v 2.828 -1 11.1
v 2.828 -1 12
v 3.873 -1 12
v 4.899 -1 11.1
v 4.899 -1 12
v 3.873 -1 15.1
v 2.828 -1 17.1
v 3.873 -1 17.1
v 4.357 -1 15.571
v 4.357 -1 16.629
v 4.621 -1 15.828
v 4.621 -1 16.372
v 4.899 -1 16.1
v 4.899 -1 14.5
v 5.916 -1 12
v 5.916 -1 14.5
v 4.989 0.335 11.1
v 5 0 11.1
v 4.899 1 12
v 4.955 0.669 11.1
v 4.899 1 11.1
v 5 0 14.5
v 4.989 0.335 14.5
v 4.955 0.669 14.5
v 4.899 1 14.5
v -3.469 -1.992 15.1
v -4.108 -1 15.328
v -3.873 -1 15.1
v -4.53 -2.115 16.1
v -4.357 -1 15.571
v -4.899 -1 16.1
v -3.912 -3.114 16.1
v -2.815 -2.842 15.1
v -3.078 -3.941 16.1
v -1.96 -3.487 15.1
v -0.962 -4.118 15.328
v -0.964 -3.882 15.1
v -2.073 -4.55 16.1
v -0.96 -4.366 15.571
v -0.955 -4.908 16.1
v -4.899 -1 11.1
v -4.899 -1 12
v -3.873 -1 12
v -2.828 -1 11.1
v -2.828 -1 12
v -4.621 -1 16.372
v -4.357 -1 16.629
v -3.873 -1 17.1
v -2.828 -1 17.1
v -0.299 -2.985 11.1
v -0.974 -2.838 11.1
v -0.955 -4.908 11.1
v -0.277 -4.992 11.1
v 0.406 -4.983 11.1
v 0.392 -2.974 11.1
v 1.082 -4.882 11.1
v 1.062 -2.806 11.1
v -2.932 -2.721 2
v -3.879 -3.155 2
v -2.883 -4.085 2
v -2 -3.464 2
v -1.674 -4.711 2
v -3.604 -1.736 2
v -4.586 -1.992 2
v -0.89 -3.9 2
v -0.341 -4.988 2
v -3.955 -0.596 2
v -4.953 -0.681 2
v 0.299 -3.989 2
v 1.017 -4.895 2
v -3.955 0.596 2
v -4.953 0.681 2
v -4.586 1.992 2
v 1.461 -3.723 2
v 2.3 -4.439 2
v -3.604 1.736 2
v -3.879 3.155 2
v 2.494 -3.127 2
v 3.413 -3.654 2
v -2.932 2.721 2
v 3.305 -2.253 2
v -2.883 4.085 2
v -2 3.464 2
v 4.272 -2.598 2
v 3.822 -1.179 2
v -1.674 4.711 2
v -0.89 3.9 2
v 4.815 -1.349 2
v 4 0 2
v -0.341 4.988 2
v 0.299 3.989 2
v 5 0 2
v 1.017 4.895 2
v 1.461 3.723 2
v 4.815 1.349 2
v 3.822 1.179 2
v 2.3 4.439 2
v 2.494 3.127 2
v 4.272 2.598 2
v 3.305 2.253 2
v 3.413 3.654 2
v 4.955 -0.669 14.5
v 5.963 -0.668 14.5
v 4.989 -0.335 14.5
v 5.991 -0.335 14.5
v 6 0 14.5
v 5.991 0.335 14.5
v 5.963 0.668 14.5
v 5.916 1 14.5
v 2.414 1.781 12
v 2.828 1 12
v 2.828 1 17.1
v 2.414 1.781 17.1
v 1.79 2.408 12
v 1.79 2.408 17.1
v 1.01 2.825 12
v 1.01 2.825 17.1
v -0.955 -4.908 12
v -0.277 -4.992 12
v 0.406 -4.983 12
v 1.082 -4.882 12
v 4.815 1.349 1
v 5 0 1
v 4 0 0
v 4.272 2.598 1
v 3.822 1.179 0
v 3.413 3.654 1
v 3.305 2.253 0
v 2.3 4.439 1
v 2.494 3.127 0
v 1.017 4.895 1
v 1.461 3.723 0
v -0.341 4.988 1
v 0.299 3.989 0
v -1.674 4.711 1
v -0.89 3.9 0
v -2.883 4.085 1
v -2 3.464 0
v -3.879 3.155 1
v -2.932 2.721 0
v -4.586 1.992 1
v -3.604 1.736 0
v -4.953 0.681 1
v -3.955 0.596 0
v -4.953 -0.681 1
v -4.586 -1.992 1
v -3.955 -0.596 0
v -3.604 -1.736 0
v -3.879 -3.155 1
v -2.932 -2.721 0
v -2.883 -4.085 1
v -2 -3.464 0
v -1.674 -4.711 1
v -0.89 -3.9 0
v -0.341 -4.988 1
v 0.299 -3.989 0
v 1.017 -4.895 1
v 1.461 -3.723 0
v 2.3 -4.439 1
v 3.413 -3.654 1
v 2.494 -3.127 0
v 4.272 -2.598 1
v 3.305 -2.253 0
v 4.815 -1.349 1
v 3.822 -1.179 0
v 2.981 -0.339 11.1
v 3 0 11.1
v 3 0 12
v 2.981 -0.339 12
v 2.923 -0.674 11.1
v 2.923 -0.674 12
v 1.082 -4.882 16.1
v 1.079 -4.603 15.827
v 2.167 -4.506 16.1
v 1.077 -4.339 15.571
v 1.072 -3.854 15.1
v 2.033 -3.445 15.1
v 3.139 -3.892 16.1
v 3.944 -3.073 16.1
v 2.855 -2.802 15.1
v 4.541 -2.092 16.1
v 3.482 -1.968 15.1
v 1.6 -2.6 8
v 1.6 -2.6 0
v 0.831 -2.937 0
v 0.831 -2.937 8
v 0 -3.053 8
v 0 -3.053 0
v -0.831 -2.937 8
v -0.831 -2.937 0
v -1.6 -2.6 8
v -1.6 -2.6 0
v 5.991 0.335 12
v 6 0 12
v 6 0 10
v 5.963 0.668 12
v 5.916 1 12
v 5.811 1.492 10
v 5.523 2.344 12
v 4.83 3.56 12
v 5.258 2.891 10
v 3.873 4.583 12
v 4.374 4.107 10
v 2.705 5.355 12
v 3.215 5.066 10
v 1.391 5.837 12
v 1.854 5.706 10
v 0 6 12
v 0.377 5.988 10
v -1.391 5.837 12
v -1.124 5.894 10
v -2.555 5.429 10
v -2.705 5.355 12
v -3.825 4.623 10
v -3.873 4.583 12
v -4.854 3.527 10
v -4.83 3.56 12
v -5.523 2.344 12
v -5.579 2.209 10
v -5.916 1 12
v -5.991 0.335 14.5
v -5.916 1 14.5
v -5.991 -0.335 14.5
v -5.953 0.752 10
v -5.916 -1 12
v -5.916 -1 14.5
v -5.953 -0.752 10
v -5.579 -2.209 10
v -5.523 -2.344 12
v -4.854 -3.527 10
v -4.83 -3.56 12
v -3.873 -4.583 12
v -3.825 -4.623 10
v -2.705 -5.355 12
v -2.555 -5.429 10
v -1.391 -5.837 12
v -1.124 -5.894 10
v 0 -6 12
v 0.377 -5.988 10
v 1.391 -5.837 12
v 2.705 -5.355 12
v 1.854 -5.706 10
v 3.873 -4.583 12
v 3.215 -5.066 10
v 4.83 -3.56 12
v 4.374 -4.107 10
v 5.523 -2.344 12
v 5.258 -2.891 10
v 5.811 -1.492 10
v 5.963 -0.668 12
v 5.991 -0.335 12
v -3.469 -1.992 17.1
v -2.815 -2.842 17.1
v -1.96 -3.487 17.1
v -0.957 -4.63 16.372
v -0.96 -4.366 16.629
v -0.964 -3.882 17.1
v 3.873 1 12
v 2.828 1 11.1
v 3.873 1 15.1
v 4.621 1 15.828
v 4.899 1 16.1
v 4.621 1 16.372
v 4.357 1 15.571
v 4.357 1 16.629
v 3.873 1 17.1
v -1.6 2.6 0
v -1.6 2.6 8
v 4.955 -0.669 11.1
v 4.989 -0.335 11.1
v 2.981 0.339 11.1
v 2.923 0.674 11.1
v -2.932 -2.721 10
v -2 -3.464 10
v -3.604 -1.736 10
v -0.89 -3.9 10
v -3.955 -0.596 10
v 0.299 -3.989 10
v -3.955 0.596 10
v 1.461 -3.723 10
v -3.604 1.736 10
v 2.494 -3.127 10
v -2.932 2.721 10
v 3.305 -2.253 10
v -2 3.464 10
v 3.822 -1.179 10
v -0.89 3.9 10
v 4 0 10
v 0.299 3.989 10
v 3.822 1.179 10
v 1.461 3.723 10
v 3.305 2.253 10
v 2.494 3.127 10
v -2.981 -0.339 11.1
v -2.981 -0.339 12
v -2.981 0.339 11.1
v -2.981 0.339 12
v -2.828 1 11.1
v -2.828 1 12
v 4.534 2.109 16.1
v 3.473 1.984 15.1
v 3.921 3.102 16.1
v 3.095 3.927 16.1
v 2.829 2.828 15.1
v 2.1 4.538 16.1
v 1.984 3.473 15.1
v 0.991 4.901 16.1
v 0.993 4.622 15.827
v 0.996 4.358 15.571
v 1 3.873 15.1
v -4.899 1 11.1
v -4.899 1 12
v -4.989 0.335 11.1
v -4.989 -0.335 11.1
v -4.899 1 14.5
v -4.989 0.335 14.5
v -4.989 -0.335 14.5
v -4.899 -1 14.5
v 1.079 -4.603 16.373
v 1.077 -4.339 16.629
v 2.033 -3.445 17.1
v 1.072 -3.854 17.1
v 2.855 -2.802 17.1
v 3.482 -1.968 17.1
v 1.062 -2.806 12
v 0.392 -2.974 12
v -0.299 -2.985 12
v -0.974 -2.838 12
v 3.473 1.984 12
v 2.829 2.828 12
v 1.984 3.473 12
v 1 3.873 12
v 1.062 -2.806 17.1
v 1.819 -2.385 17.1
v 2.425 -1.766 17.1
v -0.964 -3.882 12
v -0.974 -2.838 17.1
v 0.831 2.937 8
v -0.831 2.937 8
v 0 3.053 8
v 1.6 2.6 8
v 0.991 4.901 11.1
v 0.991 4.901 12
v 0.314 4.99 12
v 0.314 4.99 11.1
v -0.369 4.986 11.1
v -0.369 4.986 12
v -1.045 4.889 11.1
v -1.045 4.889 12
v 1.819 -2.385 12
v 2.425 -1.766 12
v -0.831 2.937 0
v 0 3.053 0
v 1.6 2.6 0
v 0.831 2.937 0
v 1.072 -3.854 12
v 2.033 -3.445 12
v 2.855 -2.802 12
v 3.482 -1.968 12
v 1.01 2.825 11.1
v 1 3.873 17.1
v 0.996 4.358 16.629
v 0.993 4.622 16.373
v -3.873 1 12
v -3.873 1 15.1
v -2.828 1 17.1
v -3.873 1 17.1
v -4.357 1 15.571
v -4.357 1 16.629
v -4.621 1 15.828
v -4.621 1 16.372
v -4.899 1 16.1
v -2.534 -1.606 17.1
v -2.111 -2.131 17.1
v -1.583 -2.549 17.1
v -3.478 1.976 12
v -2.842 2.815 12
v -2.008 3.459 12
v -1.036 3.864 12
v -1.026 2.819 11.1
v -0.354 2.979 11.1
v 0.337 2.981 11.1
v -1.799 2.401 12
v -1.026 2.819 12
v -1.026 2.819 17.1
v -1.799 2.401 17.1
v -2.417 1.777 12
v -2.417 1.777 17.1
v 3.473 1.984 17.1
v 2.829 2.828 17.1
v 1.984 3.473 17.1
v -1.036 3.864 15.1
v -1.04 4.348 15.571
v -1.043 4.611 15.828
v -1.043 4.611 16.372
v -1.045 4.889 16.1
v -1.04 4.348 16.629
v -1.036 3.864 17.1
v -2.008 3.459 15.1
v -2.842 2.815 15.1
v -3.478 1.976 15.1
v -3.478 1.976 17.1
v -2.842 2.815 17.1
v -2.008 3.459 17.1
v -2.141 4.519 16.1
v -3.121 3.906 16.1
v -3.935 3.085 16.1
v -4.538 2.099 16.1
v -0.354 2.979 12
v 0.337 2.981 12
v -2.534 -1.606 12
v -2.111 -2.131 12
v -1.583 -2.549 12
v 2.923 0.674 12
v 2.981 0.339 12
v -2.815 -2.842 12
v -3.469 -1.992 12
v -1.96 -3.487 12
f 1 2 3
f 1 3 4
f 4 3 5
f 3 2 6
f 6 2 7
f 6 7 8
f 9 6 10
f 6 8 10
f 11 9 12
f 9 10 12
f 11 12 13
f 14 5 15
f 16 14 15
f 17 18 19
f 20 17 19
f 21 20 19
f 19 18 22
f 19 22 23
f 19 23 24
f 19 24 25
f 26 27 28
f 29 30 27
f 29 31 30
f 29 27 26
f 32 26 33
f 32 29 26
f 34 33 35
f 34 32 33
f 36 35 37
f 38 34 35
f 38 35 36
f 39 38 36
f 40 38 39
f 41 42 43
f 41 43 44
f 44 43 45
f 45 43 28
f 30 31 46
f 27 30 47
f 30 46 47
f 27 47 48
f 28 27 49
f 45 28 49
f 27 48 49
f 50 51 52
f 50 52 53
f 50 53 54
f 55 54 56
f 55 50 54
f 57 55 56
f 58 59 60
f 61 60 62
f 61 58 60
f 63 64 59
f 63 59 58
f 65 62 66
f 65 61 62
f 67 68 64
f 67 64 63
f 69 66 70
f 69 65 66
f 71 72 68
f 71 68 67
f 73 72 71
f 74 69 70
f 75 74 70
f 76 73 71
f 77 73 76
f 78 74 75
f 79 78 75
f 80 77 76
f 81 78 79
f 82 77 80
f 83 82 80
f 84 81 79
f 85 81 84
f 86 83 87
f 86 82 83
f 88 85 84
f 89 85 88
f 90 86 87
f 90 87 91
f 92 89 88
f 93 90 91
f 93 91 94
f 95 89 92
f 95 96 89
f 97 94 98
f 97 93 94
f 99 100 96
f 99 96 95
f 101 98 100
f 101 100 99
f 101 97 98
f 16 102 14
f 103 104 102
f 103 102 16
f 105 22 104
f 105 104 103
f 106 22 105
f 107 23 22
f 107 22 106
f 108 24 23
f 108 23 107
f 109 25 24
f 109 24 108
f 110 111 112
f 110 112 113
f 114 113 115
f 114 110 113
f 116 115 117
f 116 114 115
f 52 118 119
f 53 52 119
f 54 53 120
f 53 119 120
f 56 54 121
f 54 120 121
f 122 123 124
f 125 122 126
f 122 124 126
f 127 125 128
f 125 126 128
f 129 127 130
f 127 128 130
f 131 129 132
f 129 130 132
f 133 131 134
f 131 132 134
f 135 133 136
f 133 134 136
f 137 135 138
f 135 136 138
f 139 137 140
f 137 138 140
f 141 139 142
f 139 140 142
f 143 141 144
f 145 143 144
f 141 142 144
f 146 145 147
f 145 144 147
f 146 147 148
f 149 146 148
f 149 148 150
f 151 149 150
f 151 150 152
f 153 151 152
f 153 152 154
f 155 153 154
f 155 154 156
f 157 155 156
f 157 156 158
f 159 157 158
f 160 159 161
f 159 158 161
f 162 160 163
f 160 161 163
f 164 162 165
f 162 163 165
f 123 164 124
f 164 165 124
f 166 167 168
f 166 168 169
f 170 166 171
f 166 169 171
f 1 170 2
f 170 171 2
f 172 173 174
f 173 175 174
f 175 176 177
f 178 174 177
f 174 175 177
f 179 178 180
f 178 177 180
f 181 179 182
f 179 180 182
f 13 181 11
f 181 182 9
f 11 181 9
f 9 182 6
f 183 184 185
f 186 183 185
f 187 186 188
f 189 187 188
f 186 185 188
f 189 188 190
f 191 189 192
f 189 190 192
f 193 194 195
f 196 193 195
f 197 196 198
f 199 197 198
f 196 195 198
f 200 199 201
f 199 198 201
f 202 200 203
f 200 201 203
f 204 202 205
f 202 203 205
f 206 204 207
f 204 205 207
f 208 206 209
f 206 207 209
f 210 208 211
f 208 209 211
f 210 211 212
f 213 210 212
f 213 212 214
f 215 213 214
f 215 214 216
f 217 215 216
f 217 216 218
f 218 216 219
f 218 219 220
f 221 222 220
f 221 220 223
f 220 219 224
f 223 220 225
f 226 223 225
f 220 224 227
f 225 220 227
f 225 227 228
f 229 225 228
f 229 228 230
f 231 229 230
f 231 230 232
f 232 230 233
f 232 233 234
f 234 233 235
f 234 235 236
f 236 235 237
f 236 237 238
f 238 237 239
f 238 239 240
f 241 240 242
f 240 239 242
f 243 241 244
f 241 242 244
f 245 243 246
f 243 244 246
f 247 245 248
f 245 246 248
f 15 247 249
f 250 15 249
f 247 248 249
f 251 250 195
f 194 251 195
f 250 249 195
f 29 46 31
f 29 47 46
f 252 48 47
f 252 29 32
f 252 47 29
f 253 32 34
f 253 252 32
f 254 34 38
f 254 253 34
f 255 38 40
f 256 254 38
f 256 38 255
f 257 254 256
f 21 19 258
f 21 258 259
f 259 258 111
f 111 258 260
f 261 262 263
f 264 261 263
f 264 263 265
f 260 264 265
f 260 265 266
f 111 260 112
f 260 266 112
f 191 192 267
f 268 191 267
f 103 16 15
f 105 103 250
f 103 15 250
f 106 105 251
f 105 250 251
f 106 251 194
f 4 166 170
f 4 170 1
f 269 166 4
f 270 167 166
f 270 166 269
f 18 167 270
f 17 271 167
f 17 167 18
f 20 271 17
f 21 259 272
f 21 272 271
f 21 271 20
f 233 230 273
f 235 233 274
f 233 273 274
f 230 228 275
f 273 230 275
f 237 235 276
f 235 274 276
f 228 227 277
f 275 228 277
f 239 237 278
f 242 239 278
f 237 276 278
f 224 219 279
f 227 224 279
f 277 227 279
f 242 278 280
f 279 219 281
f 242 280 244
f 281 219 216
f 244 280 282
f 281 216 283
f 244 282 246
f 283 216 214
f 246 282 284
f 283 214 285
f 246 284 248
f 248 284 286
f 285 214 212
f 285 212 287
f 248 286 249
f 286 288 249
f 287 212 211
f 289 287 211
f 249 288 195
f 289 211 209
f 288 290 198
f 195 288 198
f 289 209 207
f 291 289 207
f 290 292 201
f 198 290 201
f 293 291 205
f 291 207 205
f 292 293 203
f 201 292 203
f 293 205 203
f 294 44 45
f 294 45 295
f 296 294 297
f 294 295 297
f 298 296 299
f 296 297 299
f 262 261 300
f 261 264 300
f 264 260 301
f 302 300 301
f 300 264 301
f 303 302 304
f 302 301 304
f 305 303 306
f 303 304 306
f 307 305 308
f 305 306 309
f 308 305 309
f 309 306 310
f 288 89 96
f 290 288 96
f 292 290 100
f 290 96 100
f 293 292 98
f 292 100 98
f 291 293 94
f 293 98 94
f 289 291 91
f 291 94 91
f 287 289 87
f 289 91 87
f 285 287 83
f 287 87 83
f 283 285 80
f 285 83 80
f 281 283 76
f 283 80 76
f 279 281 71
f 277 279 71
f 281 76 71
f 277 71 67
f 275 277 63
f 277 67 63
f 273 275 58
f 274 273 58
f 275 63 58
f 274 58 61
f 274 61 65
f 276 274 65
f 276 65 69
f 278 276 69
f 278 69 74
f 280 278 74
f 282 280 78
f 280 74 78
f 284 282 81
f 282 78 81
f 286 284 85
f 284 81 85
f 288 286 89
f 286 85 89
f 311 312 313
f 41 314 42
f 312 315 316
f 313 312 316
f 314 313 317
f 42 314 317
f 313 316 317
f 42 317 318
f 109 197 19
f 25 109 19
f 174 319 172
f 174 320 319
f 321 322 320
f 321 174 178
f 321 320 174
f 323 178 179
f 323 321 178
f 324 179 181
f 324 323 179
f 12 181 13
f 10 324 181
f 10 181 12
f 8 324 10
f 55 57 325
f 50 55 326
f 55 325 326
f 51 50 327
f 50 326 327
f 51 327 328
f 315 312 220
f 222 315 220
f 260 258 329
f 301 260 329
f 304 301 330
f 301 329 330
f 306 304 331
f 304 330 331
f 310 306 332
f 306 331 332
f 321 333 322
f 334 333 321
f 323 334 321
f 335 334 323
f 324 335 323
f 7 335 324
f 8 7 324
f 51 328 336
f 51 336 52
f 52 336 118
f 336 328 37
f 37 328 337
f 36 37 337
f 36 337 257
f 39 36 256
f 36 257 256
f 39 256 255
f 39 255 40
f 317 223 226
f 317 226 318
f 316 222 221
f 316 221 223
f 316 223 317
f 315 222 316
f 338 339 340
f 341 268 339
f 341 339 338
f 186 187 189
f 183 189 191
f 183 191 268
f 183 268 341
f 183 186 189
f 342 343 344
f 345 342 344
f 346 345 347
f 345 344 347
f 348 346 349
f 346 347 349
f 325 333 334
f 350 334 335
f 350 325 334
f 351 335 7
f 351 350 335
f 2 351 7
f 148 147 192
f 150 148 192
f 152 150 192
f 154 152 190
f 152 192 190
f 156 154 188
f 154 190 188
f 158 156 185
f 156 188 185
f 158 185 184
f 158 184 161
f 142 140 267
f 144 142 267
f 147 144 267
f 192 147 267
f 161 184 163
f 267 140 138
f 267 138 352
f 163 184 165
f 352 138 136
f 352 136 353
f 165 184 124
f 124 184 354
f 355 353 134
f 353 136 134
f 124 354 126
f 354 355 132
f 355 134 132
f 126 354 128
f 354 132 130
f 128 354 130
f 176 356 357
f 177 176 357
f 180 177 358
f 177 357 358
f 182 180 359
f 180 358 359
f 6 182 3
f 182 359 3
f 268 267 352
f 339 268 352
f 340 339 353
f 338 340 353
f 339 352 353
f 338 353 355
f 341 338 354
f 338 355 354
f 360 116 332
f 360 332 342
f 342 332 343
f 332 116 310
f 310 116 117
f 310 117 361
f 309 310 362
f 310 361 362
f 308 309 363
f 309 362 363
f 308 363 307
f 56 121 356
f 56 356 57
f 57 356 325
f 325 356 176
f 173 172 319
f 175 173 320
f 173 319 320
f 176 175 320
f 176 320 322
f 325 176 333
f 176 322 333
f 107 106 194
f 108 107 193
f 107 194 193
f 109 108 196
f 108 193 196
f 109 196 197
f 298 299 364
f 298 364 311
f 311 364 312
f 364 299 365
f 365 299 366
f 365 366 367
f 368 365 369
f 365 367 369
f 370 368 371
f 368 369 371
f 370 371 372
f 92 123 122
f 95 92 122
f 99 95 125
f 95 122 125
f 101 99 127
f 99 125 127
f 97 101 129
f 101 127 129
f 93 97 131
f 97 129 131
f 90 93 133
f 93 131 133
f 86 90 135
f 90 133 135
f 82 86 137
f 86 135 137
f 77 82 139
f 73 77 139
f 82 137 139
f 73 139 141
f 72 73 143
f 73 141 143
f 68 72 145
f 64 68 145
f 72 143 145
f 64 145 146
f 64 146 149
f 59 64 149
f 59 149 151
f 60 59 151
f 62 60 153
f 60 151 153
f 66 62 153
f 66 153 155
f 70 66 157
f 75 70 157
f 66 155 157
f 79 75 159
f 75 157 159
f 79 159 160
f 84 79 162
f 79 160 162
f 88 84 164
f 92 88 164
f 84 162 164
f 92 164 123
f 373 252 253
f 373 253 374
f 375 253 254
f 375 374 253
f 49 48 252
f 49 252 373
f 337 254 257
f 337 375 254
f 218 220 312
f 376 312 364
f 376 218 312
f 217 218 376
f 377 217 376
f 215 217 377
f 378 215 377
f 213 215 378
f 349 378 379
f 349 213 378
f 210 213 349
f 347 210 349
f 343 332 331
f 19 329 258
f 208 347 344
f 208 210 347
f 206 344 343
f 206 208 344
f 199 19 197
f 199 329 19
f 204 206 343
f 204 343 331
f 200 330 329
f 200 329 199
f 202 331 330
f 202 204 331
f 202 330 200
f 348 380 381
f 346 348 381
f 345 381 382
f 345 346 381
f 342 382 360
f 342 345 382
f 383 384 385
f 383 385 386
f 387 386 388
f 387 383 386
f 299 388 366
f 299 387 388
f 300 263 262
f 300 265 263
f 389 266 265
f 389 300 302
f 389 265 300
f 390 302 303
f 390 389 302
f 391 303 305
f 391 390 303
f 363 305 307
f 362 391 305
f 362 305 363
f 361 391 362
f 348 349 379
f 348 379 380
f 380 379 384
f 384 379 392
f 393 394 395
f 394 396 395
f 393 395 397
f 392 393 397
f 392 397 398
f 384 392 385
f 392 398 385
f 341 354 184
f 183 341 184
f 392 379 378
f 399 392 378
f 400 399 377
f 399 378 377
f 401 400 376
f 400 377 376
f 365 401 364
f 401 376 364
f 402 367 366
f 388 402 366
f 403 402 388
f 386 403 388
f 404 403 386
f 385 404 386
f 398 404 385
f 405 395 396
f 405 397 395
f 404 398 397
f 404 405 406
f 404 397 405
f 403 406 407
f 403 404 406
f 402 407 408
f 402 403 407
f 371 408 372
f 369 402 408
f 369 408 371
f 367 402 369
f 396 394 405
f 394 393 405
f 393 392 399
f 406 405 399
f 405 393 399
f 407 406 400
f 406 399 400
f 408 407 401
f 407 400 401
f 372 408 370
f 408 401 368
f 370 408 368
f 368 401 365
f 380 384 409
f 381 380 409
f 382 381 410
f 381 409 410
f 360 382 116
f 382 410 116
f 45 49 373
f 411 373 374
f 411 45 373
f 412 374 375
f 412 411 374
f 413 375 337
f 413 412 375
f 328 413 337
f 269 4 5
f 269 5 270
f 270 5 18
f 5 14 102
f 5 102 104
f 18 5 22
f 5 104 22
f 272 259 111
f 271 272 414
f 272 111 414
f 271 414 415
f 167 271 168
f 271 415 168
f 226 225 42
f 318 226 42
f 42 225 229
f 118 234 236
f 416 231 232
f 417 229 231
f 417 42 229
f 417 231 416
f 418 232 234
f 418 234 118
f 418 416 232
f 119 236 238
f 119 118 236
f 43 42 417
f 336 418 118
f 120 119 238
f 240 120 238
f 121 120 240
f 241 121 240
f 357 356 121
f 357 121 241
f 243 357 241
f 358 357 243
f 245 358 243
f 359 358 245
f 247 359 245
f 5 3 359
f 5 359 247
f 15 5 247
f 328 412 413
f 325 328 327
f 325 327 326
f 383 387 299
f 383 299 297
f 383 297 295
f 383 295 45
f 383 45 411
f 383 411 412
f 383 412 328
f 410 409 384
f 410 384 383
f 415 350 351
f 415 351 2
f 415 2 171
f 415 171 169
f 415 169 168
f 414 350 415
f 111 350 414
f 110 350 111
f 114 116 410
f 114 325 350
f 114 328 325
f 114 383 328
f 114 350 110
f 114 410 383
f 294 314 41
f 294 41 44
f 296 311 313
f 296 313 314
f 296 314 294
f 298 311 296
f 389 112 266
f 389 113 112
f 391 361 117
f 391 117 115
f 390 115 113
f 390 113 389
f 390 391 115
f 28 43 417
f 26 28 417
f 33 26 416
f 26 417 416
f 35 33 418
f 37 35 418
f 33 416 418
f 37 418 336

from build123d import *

# Parameters (mm, degrees)
F0_R      = 5
F1_DEPTH  = 2
F2_R      = 4
F3_DEPTH  = 8
F4_R      = 6
F5_DEPTH  = 2
F7_DEPTH  = 2.5
F10_DEPTH = 8
F11_SIZE  = 1
F8_R      = 4
F8_R_2    = 3
F12_DEPTH = 3.1
F13_R     = 5
F13_R_2   = 4
F13_R_3   = 3
F14_DEPTH = 2
F16_DEPTH = 6
F17_SIZE  = 0.99999


# Not quite as in the source:
# - a fillet or chamfer is up to 0.001 mm smaller than in the source, because OpenCascade refuses the exact size


with BuildPart() as f1:
    # F0 (on Top) → F1 (new body)
    with BuildSketch(Plane.XY):
        Circle(F0_R)
    extrude(amount=F1_DEPTH)

    # F2 (on face) → F3 (join)
    with BuildSketch(Plane.XY.offset(2)):
        Circle(F2_R)
    extrude(amount=F3_DEPTH)

    # F4 (on face) → F5 (join)
    with BuildSketch(Plane.XY.offset(10)):
        Circle(F4_R)
    extrude(amount=F5_DEPTH)

    # F6 (on face) → F7 (join)
    with BuildSketch(Plane.XY.offset(12)):
        with BuildLine():
            ThreePointArc((6, 0), (5.9789831367, 0.5017575617), (5.9160797831, 1))
            Line((5.9160797831, 1), (4.5160797831, 1))
            Line((4.5160797831, 1), (4.5160797831, -1))
            Line((4.5160797831, -1), (5.9160797831, -1))
            ThreePointArc((5.9160797831, -1), (5.9789831367, -0.5017575617), (6, 0))
        make_face()
        with BuildLine():
            Line((-4.5160797831, 1), (-5.9160797831, 1))
            ThreePointArc((-5.9160797831, 1), (-6, 0), (-5.9160797831, -1))
            Line((-5.9160797831, -1), (-4.5160797831, -1))
            Line((-4.5160797831, -1), (-4.5160797831, 1))
        make_face()
    extrude(amount=F7_DEPTH)

    # F9 (on face) → F10 (cut)
    with BuildSketch(Plane(origin=(0, 0, 0), x_dir=(1, 0, 0), z_dir=(0, 0, -1))):
        with BuildLine():
            ThreePointArc((1.6, 2.6), (0, 3.0528675045), (-1.6, 2.6))
            Line((-1.6, 2.6), (-1.6, -2.6))
            ThreePointArc((-1.6, -2.6), (0, -3.0528675045), (1.6, -2.6))
            Line((1.6, -2.6), (1.6, 2.6))
        make_face()
    extrude(amount=-F10_DEPTH, mode=Mode.SUBTRACT)

    # F11
    f11_edges = [f1.edges().sort_by_distance(p)[0] for p in [
        (-5, 0, 0),
    ]]
    chamfer(f11_edges, length=F11_SIZE)

    # F8 (on face) → F12 (join)
    with BuildSketch(Plane.XY.offset(12)):
        Circle(F8_R)
        Circle(F8_R_2, mode=Mode.SUBTRACT)
    extrude(amount=F12_DEPTH)

    # F13 (on face) → F14 (join)
    with BuildSketch(Plane.XY.offset(15.1)):
        Circle(F13_R)
        Circle(F13_R_2, mode=Mode.SUBTRACT)
        Circle(F13_R_2)
        Circle(F13_R_3, mode=Mode.SUBTRACT)
    extrude(amount=F14_DEPTH)

    # F15 (on face) → F16 (cut)
    with BuildSketch(Plane.XY.offset(17.1)):
        with BuildLine():
            Line((-2.8284271247, 1), (-4.8989794856, 1))
            ThreePointArc((-4.8989794856, 1), (-5, 0), (-4.8989794856, -1))
            Line((-4.8989794856, -1), (-2.8284271247, -1))
            ThreePointArc((-2.8284271247, -1), (-3, 0), (-2.8284271247, 1))
        make_face()
        with BuildLine():
            ThreePointArc((0.9908586892, 4.9008365672), (-0.0278443772, 4.9999224685), (-1.0453806817, 4.8894968279))
            Line((-1.0453806817, 4.8894968279), (-1.0261823806, 2.819033473))
            ThreePointArc((-1.0261823806, 2.819033473), (-0.0085441177, 2.999987833), (1.0101083624, 2.8248329324))
            Line((1.0101083624, 2.8248329324), (0.9908586892, 4.9008365672))
        make_face()
        with BuildLine():
            ThreePointArc((5, 0), (4.974680765, 0.50254481), (4.8989794856, 1))
            Line((4.8989794856, 1), (2.8284271247, 1))
            ThreePointArc((2.8284271247, 1), (2.956795679, 0.5073059362), (3, 0))
            ThreePointArc((3, 0), (2.956795679, -0.5073059362), (2.8284271247, -1))
            Line((2.8284271247, -1), (4.8989794856, -1))
            ThreePointArc((4.8989794856, -1), (4.974680765, -0.50254481), (5, 0))
        make_face()
        with BuildLine():
            Line((-0.9737316464, -2.8375776079), (-0.9545333452, -4.9080409628))
            ThreePointArc((-0.9545333452, -4.9080409628), (0.0648756616, -4.9995790971), (1.0815661863, -4.8816200779))
            Line((1.0815661863, -4.8816200779), (1.0623165131, -2.8056164431))
            ThreePointArc((1.0623165131, -2.8056164431), (0.0470871391, -2.9996304441), (-0.9737316464, -2.8375776079))
        make_face()
    extrude(amount=-F16_DEPTH, mode=Mode.SUBTRACT)

    # F17 (size 1 in the source; OpenCascade refuses exactly that, so slightly less here)
    f17_edges = [f1.edges().sort_by_distance(p)[0] for p in [
        (3.564895, -3.505927, 15.1),
        (-3.551887, 3.519105, 15.1),
        (-3.519105, -3.551887, 15.1),
        (3.564895, -3.505927, 17.1),
        (-3.519105, -3.551887, 17.1),
        (-3.551887, 3.519105, 17.1),
        (3.532234, 3.53883, 17.1),
        (3.532234, 3.53883, 15.1),
    ]]
    chamfer(f17_edges, length=F17_SIZE)


solid = f1.part
